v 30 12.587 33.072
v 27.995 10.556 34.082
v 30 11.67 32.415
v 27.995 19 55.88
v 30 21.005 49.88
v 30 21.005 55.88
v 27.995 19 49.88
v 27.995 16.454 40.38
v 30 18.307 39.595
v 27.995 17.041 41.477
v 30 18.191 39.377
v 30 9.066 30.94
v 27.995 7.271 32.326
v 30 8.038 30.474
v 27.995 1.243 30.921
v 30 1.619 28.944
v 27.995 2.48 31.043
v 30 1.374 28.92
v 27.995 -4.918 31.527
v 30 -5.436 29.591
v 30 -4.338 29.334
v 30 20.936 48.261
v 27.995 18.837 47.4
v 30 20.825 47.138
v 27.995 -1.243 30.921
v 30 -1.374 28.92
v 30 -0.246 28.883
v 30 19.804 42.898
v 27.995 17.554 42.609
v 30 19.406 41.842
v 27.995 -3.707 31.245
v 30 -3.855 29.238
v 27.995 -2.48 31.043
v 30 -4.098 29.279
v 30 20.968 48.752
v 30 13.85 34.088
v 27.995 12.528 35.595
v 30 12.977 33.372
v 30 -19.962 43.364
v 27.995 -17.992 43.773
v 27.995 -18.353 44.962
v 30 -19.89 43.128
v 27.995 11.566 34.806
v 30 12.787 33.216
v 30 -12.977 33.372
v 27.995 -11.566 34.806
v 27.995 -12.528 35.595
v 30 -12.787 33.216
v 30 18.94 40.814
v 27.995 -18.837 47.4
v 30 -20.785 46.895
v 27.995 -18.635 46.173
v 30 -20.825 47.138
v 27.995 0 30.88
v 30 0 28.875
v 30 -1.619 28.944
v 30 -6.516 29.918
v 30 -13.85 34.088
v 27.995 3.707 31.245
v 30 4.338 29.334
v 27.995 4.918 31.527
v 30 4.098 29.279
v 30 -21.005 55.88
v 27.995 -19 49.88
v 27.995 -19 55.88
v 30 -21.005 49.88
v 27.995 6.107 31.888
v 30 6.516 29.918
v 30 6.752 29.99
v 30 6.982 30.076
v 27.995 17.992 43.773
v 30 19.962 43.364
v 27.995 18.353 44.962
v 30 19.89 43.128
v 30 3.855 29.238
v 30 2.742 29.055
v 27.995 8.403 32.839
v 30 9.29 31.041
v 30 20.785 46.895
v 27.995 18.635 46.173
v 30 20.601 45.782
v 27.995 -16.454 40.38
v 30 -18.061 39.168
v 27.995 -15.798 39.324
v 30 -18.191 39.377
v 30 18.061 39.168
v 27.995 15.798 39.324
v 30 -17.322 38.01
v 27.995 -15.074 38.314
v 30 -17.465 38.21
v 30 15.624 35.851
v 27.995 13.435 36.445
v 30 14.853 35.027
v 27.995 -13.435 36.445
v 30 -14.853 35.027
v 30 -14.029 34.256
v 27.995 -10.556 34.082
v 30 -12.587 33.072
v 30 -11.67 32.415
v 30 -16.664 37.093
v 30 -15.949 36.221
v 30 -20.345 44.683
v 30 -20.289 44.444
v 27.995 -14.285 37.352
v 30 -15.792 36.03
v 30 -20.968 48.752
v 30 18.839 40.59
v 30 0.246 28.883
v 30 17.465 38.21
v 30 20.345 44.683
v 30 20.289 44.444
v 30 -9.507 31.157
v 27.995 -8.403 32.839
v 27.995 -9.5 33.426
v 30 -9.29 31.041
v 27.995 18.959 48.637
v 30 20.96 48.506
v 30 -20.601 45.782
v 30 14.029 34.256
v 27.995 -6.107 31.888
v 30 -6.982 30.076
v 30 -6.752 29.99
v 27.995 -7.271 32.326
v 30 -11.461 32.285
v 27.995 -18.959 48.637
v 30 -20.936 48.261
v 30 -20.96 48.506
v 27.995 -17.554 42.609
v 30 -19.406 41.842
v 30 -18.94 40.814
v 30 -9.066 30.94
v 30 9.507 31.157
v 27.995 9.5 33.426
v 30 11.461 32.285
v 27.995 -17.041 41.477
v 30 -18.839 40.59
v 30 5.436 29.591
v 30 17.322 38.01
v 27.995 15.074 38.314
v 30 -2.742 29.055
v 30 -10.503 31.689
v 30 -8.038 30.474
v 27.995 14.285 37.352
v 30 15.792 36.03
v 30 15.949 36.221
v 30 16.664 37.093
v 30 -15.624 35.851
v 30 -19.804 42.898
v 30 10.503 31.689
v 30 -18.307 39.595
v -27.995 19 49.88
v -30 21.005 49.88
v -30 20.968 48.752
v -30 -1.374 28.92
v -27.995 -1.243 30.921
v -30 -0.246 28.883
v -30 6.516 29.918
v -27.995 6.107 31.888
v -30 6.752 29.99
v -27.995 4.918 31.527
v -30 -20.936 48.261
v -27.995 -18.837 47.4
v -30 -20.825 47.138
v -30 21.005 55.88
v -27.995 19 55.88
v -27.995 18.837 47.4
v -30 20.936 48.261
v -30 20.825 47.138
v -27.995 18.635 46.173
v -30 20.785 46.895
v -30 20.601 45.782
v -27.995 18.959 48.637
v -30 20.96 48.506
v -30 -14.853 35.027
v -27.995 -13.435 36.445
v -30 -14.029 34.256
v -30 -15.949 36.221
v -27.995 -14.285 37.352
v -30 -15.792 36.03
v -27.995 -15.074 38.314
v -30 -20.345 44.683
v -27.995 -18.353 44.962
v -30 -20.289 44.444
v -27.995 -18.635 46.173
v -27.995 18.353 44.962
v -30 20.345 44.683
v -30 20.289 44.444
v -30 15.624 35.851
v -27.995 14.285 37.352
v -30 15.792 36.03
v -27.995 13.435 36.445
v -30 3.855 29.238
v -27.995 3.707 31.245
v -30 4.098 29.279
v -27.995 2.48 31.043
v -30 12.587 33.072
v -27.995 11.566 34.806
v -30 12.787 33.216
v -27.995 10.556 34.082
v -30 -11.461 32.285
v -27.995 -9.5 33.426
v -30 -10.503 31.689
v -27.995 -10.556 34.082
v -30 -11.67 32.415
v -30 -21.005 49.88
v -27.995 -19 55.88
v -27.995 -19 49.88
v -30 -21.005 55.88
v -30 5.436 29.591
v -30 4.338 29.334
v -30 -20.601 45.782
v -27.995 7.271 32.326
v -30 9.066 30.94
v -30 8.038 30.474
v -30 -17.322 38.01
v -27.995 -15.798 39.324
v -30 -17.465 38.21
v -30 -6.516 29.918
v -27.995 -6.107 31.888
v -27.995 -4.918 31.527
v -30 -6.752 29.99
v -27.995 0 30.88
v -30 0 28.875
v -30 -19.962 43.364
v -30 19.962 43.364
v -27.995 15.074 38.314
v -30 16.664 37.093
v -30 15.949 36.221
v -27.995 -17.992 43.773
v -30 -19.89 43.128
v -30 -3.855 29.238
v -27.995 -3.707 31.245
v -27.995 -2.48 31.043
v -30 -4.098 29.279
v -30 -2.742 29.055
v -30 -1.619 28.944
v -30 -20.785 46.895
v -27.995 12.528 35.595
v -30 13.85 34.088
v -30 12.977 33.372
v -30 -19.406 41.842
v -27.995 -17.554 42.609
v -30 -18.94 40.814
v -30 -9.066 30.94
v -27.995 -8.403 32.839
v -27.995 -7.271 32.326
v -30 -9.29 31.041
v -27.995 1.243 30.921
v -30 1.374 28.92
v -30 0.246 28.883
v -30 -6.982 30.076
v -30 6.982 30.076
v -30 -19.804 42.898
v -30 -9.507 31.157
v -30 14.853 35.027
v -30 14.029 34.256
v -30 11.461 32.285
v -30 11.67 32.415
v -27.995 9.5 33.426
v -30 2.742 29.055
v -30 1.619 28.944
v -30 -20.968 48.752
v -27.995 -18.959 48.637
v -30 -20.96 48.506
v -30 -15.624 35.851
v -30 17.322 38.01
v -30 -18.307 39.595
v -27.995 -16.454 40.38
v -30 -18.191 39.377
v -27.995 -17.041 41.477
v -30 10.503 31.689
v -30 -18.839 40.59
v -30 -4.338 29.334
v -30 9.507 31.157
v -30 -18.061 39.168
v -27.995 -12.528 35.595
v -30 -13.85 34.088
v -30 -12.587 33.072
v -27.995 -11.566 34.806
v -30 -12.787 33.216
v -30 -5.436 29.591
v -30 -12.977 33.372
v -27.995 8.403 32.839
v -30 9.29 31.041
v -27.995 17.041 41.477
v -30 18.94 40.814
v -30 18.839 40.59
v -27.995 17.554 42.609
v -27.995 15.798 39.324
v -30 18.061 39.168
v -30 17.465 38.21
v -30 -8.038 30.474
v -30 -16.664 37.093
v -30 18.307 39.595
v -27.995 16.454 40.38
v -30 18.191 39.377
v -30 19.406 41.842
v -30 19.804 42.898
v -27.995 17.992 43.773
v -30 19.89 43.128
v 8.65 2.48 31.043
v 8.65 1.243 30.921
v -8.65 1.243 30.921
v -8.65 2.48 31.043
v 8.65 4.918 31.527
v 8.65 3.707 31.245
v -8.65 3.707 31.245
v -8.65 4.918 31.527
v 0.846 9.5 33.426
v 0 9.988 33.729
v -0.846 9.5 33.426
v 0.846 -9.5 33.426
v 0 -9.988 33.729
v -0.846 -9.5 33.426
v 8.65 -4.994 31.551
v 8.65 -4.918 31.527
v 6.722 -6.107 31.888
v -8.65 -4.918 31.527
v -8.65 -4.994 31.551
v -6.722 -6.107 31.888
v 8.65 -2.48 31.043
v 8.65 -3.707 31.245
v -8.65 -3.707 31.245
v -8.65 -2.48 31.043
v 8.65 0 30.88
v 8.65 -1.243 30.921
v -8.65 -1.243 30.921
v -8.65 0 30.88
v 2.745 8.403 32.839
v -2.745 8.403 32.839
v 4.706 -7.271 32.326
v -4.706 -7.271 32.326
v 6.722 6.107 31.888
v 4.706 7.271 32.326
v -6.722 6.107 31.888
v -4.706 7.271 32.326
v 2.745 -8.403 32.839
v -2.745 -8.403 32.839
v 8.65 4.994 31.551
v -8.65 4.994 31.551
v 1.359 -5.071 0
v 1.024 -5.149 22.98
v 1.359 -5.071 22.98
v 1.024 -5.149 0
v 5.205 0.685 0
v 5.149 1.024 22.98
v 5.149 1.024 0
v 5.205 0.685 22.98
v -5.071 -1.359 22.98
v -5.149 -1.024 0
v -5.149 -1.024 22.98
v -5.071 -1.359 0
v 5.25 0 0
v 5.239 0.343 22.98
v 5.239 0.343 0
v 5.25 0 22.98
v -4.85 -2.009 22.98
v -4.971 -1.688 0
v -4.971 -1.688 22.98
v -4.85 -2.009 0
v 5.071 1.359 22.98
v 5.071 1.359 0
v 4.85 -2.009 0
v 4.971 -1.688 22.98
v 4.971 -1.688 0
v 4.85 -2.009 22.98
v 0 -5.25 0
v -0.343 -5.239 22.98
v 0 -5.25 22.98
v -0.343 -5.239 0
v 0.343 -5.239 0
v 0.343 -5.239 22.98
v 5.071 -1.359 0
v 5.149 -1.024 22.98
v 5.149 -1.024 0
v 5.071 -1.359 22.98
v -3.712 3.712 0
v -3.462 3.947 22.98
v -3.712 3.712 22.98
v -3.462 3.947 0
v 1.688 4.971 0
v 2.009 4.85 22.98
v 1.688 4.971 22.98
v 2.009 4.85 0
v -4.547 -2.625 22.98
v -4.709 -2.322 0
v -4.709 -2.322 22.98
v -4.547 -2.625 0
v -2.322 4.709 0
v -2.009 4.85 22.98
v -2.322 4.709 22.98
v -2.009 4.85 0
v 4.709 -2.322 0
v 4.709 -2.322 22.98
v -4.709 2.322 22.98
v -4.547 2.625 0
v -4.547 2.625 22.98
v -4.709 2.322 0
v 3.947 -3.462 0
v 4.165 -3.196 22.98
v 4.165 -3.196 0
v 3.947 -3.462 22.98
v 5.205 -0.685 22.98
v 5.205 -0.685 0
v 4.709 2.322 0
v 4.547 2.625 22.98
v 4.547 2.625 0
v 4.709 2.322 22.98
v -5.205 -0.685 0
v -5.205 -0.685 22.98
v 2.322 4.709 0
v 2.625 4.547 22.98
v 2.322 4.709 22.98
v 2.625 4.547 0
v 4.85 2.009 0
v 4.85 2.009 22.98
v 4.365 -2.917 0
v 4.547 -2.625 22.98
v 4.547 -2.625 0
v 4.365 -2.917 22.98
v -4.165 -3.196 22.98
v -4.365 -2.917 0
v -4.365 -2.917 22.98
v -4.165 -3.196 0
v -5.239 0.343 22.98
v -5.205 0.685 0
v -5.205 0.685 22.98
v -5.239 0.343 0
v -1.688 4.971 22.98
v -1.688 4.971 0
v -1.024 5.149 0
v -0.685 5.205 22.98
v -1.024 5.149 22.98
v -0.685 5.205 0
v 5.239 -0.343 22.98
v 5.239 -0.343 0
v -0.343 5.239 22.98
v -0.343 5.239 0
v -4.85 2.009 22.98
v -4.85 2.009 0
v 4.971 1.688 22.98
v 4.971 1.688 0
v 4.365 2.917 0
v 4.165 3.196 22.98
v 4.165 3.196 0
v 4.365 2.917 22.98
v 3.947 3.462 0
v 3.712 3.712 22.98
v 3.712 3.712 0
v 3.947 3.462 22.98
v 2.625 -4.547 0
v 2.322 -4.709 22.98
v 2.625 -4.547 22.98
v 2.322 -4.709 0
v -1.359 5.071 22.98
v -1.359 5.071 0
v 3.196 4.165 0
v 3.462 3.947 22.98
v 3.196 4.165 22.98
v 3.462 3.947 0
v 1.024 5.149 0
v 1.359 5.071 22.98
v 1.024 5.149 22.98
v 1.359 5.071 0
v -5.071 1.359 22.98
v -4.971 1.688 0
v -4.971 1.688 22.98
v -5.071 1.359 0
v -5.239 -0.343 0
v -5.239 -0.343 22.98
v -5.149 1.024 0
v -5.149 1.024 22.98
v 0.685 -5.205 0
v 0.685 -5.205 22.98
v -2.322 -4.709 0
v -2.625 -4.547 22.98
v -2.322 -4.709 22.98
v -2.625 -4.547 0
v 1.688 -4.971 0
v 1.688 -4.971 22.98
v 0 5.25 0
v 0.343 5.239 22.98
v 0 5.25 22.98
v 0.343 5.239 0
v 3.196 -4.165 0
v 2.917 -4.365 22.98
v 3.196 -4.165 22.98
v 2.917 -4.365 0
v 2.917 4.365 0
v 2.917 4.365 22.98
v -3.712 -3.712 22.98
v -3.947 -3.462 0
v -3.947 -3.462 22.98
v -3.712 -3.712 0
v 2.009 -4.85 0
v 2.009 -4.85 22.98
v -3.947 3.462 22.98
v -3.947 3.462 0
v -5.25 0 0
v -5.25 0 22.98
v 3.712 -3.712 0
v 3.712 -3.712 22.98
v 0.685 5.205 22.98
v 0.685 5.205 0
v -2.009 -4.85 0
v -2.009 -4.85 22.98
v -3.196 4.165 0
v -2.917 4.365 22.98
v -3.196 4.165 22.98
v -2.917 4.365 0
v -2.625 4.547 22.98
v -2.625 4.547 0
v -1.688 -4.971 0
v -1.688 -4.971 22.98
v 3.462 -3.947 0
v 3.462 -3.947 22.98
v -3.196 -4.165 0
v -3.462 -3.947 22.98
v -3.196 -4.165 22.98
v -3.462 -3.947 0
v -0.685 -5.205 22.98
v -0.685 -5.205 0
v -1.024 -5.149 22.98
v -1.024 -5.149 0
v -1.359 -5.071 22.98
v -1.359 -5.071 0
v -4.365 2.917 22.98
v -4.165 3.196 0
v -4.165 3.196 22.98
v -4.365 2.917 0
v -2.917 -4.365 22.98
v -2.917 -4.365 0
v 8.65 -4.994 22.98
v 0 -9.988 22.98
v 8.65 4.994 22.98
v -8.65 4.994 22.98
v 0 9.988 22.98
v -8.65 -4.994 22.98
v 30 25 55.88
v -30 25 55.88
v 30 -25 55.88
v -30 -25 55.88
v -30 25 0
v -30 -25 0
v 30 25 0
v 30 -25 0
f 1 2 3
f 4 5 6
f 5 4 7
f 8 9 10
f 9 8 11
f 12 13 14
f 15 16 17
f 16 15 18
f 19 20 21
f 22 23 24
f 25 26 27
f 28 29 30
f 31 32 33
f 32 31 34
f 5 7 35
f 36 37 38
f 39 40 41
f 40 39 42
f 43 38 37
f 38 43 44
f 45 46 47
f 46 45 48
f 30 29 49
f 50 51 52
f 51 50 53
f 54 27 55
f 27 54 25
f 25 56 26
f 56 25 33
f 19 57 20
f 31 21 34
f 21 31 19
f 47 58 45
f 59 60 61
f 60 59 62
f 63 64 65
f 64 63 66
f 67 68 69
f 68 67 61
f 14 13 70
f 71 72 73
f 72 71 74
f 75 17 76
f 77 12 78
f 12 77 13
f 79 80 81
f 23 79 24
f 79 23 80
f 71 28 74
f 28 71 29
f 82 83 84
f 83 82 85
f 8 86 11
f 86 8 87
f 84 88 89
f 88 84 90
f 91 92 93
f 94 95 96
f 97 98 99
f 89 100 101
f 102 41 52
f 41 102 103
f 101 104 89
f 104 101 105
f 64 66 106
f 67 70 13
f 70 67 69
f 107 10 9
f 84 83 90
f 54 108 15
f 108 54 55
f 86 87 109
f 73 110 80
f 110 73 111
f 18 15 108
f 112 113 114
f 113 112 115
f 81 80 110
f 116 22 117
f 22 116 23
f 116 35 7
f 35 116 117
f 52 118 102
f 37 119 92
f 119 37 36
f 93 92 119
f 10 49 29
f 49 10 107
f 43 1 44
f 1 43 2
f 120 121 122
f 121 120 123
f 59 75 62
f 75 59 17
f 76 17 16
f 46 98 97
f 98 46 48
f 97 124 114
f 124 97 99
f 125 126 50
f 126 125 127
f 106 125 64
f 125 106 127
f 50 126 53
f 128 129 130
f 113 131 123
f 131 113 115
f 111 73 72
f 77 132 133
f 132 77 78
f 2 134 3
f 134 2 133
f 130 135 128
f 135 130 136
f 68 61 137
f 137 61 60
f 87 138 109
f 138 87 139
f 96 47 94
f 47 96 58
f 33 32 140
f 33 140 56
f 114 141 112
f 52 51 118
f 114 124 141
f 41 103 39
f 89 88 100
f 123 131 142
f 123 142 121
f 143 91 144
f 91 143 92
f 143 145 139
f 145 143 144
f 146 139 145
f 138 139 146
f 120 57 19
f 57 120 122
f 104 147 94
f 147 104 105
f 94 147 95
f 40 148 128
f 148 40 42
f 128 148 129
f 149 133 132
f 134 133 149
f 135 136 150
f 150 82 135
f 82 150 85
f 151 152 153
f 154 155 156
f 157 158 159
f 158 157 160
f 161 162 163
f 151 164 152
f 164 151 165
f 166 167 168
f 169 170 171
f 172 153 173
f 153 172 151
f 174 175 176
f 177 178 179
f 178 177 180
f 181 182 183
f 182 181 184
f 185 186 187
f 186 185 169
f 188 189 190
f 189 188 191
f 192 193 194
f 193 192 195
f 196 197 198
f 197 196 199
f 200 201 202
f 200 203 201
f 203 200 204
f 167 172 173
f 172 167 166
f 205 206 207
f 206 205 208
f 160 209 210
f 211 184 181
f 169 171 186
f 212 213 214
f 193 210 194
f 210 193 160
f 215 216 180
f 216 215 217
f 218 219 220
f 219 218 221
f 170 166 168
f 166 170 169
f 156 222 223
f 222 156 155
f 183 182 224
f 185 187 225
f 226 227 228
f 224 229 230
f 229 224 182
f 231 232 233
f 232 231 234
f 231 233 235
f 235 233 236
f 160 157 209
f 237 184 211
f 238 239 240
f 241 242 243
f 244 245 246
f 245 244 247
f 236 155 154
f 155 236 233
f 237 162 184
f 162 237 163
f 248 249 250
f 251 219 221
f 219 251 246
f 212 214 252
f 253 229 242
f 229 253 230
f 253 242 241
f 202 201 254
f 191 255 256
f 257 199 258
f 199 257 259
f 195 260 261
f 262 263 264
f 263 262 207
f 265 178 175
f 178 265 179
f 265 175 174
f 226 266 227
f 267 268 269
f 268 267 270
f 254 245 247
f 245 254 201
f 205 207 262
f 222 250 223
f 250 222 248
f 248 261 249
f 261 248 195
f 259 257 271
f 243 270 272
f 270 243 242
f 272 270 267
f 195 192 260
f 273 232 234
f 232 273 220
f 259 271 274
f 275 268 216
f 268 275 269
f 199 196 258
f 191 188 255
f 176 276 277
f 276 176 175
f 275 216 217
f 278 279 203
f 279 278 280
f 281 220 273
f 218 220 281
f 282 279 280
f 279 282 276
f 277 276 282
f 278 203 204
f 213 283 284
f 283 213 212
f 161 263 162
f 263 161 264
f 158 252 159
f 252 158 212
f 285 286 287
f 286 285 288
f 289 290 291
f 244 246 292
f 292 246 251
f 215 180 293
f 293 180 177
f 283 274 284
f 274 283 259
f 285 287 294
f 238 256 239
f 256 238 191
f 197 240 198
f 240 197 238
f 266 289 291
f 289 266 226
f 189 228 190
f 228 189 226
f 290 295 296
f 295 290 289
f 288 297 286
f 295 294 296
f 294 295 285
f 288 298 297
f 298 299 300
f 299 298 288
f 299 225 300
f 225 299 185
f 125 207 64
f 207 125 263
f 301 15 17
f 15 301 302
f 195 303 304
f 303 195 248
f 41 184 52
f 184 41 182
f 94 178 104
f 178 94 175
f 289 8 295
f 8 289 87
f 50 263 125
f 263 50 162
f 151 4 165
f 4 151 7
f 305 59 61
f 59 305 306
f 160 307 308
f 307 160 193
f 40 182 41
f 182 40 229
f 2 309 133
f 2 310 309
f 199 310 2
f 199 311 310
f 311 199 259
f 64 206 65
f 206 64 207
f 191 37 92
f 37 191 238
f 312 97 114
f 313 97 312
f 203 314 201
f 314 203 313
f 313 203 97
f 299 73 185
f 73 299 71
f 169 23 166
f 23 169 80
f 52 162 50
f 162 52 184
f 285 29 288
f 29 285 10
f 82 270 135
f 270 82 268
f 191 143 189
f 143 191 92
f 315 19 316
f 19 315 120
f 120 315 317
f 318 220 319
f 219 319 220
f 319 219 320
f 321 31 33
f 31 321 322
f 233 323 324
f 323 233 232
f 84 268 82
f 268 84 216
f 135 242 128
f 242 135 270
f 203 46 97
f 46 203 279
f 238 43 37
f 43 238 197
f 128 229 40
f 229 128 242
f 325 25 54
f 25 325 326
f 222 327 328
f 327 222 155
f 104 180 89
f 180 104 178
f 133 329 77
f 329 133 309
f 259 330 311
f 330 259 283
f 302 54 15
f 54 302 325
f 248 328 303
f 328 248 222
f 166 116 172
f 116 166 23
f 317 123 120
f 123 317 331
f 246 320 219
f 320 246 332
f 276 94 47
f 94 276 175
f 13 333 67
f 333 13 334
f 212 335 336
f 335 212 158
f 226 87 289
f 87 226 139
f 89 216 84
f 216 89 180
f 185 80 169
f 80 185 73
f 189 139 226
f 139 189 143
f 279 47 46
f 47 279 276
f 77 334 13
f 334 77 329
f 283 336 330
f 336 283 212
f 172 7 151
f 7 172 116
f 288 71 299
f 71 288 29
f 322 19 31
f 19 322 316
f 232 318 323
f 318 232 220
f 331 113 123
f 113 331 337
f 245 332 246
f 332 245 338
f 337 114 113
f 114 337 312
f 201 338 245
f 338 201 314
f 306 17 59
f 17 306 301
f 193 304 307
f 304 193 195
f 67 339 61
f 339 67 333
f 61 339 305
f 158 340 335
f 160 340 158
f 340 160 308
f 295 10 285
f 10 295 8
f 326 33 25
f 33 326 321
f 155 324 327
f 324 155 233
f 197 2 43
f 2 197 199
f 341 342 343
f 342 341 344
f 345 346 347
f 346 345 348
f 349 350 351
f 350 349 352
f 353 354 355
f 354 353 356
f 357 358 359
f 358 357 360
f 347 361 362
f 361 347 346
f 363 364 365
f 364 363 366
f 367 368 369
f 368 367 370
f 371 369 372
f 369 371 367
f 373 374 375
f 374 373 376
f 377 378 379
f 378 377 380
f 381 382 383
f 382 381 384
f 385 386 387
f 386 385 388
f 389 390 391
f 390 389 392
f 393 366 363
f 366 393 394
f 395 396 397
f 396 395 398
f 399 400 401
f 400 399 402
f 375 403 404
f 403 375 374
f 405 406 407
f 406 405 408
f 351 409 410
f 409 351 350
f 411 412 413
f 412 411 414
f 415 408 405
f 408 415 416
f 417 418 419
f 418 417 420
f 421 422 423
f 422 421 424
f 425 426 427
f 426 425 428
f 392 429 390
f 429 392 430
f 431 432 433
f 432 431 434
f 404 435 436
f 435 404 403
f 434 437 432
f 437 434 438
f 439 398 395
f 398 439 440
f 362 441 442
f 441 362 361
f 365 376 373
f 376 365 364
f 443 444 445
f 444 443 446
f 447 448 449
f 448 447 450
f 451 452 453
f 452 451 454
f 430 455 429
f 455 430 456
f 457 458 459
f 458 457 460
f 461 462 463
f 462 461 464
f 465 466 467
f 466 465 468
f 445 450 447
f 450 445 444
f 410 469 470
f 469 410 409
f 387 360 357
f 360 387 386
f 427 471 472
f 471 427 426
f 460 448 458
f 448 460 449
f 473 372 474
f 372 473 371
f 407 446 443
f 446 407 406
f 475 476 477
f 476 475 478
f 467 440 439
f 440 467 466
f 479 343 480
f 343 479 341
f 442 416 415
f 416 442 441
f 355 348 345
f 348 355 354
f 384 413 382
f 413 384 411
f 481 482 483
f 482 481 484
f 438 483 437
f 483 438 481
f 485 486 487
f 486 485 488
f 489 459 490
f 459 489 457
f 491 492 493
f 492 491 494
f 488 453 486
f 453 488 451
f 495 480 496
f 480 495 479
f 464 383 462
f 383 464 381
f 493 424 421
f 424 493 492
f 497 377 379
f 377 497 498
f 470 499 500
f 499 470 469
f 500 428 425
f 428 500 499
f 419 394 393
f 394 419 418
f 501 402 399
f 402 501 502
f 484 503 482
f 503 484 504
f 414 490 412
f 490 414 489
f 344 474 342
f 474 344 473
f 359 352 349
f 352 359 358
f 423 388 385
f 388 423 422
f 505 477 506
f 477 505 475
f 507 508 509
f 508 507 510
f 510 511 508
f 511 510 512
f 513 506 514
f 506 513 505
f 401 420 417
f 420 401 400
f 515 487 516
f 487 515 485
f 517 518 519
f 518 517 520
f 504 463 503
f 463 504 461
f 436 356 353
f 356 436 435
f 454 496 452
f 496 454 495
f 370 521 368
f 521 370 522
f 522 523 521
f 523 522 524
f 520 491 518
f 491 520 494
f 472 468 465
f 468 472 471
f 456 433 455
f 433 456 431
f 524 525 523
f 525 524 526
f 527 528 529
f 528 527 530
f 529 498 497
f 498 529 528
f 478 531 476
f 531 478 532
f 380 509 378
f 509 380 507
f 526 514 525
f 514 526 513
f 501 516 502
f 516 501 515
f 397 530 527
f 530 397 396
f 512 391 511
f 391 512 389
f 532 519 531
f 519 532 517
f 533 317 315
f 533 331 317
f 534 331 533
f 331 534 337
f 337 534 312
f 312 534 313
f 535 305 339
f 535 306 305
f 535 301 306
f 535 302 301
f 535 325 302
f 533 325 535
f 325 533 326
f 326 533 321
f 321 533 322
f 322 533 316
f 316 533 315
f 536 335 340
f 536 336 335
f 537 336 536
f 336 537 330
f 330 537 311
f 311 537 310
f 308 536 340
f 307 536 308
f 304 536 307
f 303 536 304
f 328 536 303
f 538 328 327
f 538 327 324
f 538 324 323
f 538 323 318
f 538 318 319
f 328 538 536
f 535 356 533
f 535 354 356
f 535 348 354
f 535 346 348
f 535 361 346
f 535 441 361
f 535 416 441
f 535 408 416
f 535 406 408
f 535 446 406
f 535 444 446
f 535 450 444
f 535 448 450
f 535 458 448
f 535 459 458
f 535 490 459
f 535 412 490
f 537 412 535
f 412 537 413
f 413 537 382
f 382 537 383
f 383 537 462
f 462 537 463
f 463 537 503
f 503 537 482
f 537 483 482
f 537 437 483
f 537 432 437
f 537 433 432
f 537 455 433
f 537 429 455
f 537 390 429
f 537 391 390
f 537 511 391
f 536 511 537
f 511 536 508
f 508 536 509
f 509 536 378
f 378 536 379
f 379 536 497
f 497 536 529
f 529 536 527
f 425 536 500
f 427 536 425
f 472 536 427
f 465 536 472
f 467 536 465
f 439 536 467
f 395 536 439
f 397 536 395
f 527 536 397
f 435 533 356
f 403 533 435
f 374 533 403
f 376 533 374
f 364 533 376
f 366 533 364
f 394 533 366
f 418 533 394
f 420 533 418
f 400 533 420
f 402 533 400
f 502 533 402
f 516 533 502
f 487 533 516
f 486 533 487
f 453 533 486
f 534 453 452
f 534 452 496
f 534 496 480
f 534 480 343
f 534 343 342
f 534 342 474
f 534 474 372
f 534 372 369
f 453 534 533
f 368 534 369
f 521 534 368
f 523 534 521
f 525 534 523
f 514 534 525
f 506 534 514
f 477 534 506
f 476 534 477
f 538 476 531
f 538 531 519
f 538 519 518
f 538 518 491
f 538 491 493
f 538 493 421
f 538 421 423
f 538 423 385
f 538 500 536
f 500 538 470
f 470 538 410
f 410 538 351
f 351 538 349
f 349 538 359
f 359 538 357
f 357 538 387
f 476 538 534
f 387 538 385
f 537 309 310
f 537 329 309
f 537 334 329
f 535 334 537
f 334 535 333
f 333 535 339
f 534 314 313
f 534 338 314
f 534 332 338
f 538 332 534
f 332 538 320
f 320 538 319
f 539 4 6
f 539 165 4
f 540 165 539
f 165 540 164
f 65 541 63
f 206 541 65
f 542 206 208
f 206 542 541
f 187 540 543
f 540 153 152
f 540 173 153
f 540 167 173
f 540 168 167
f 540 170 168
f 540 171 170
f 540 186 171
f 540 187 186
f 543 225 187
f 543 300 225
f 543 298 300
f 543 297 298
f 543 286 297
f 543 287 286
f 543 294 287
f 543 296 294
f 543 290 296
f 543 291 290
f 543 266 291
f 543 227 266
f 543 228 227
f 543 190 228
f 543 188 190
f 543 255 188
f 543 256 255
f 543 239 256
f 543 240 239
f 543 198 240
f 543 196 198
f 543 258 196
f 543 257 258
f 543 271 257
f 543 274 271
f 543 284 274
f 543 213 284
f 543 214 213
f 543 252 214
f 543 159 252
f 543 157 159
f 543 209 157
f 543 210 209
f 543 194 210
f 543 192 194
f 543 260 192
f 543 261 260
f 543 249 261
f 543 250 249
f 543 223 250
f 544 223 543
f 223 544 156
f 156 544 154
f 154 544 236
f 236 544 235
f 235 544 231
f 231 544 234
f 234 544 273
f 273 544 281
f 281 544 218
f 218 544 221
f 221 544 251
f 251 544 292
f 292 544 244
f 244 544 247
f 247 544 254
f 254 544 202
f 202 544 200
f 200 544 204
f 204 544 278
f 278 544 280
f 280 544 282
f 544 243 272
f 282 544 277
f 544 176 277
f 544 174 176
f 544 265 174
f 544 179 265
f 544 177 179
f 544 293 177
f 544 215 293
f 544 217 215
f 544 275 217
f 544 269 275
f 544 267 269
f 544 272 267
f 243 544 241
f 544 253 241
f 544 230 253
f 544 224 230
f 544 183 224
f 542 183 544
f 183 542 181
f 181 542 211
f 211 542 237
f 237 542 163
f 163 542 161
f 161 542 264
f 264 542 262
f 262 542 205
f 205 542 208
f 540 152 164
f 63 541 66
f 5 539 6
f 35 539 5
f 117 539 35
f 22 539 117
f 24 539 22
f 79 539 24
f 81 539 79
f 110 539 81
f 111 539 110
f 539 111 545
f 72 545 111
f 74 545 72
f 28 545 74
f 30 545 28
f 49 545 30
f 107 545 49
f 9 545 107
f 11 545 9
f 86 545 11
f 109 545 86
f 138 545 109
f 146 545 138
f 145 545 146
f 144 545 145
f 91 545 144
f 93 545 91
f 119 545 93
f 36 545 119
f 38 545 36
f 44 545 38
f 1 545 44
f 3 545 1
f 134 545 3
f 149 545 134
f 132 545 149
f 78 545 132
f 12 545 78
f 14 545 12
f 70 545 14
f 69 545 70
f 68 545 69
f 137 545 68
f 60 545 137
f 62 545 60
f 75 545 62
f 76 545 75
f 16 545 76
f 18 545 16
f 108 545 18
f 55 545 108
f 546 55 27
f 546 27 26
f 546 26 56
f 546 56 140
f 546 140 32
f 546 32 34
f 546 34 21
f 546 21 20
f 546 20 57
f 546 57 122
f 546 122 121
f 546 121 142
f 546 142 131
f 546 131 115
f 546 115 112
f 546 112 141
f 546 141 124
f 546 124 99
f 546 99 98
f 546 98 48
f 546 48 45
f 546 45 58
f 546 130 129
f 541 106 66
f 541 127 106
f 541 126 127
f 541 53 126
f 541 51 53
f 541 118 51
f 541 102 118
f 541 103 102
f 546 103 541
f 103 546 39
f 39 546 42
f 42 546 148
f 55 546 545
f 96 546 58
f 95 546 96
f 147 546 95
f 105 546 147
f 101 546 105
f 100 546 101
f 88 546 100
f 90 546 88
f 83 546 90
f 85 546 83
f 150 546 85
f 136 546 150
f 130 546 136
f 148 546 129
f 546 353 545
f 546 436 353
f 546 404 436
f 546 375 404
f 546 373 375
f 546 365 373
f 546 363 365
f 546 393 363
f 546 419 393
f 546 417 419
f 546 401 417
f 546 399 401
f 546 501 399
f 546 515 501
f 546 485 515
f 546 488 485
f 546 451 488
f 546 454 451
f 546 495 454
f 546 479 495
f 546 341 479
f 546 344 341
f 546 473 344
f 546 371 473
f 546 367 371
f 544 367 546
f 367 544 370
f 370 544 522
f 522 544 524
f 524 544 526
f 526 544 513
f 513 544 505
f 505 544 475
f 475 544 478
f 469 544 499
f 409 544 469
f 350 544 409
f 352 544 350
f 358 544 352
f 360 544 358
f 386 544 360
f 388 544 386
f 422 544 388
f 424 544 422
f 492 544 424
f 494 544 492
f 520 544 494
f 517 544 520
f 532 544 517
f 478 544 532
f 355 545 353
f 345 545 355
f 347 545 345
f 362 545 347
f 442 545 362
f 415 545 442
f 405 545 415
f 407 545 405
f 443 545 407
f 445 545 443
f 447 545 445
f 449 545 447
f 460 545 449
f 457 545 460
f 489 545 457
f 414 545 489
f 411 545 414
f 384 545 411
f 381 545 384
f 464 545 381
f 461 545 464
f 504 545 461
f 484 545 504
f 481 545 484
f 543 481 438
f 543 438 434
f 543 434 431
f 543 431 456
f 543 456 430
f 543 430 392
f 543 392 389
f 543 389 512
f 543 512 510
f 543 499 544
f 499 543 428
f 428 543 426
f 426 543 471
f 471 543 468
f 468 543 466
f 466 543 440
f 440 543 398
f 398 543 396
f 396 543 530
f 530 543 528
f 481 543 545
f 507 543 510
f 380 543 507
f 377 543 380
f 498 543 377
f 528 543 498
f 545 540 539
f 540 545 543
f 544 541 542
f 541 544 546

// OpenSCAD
// file: FET_pipe_guide.scad
// freETarget (Competition build) pipe-guide bracket
// A hex pocket traps the M10 bolt head (NUT_TRAP = false) or an M10 nut (NUT_TRAP = true),
// so the fastener is tightened from inside the target box.
// Build all four STLs with ../build-stls.sh.
// Rides the 1" steel pipe uprights so the target can't twist while raising/lowering.
// Source dims: freETarget drawings FRE-007 / FRE-008 (side panels):
//   housing outside width 304 mm, 2x dia 10 mm side holes, 250 mm apart.
//
// Model axes: X = out from the side panel (X=0 is the panel face, printed on the bed)
//             Y = front/back,  Z = vertical, Z=0 at the side-hole centre.
// Set ONE_PIECE = true for a single bracket spanning both holes (needs a >=310 mm bed).

ONE_PIECE   = false;
NUT_TRAP    = false;        // true: trap an M10 nut (bolt head inside the box, use M10x40)
                            // false: trap the hex bolt HEAD (nut inside the box, use M10x55)

IN          = 25.4;
TARGET_W    = 304;          // outside width across side panels
PIPE_GAP_W  = 14.4 * IN;    // design inside-to-inside pipe spacing (measured ~14.5")
PIPE_OD     = 33.4;         // 1" NPS steel pipe = 1.315"
HOLE_PITCH  = 250;          // side-hole spacing

U_CLEAR     = 2.3;          // radial clearance, pipe to U
ARM_T       = 6;            // U arm wall thickness
ARM_PAST    = 6;            // how far the arms extend past the U centre
LEN         = 60;           // height of each bracket head
LEAD        = 2;            // 45-degree lead-in on the U at top and bottom
BOLT_D      = 10.5;         // M10 clearance
HEX_AF      = 17.3;         // hex pocket across flats: traps a 17 mm (DIN 933) or 16 mm (ISO 4017) M10 head
HEAD_H      = NUT_TRAP ? 8 : 6.4;       // M10 nut height / M10 hex head height
HEAD_RECESS = NUT_TRAP ? 4 : 1.5;       // nut/head top sits this far below the U floor
WEB_T       = 10;           // one-piece only: web thickness

FLOOR_X   = (PIPE_GAP_W - TARGET_W) / 2;   // 30.88
U_R       = PIPE_OD/2 + U_CLEAR;           // 19.0
U_CX      = FLOOR_X + U_R;
HALF_W    = U_R + ARM_T;
X_MAX     = U_CX + ARM_PAST;
CB_BOTTOM = FLOOR_X - HEAD_RECESS - HEAD_H;

$fn = 96;

module u_cavity_2d(r) {            // in the XY plane
    translate([U_CX, 0]) circle(r);
    translate([U_CX, -r]) square([X_MAX + 10, 2*r]);
}

module u_cavity() {                // extruded along Z with lead-in flares at both ends
    translate([0,0,-LEN/2 - 1]) linear_extrude(LEN + 2) u_cavity_2d(U_R);
    // 45-degree flare: radius U_R at (LEN/2 - LEAD), U_R + LEAD + 0.5 at (LEN/2 + 0.5)
    for (s = [-1, 1])
        hull() {
            translate([0,0, s*(LEN/2 - LEAD)]) linear_extrude(0.01, center=true) u_cavity_2d(U_R);
            translate([0,0, s*(LEN/2 + 0.5)])  linear_extrude(0.01, center=true) u_cavity_2d(U_R + LEAD + 0.5);
        }
}

module bolt_cut() {
    rotate([0,90,0]) translate([0,0,-1]) cylinder(d=BOLT_D, h=X_MAX + 2);
    // hex pocket (anti-rotation) for the bolt head
    translate([CB_BOTTOM,0,0]) rotate([0,90,0]) rotate([0,0,30])
        cylinder(d=HEX_AF/cos(30), h=X_MAX, $fn=6);
}

module head_body() {
    translate([0, -HALF_W, -LEN/2]) cube([X_MAX, 2*HALF_W, LEN]);
}

module bracket() {
    difference() {
        union() {
            head_body();
            if (ONE_PIECE) {
                translate([0,0,HOLE_PITCH]) head_body();
                translate([0, -HALF_W, 0]) cube([WEB_T, 2*HALF_W, HOLE_PITCH]);
            }
        }
        u_cavity();
        bolt_cut();
        if (ONE_PIECE) translate([0,0,HOLE_PITCH]) { u_cavity(); bolt_cut(); }
    }
}

// Print orientation: panel face (X=0) down on the bed.
rotate([0,-90,0]) bracket();
// main file
// captured_bolt_print_x4
include <FET_pipe_guide.scad>
NUT_TRAP  = false;
ONE_PIECE = false;
